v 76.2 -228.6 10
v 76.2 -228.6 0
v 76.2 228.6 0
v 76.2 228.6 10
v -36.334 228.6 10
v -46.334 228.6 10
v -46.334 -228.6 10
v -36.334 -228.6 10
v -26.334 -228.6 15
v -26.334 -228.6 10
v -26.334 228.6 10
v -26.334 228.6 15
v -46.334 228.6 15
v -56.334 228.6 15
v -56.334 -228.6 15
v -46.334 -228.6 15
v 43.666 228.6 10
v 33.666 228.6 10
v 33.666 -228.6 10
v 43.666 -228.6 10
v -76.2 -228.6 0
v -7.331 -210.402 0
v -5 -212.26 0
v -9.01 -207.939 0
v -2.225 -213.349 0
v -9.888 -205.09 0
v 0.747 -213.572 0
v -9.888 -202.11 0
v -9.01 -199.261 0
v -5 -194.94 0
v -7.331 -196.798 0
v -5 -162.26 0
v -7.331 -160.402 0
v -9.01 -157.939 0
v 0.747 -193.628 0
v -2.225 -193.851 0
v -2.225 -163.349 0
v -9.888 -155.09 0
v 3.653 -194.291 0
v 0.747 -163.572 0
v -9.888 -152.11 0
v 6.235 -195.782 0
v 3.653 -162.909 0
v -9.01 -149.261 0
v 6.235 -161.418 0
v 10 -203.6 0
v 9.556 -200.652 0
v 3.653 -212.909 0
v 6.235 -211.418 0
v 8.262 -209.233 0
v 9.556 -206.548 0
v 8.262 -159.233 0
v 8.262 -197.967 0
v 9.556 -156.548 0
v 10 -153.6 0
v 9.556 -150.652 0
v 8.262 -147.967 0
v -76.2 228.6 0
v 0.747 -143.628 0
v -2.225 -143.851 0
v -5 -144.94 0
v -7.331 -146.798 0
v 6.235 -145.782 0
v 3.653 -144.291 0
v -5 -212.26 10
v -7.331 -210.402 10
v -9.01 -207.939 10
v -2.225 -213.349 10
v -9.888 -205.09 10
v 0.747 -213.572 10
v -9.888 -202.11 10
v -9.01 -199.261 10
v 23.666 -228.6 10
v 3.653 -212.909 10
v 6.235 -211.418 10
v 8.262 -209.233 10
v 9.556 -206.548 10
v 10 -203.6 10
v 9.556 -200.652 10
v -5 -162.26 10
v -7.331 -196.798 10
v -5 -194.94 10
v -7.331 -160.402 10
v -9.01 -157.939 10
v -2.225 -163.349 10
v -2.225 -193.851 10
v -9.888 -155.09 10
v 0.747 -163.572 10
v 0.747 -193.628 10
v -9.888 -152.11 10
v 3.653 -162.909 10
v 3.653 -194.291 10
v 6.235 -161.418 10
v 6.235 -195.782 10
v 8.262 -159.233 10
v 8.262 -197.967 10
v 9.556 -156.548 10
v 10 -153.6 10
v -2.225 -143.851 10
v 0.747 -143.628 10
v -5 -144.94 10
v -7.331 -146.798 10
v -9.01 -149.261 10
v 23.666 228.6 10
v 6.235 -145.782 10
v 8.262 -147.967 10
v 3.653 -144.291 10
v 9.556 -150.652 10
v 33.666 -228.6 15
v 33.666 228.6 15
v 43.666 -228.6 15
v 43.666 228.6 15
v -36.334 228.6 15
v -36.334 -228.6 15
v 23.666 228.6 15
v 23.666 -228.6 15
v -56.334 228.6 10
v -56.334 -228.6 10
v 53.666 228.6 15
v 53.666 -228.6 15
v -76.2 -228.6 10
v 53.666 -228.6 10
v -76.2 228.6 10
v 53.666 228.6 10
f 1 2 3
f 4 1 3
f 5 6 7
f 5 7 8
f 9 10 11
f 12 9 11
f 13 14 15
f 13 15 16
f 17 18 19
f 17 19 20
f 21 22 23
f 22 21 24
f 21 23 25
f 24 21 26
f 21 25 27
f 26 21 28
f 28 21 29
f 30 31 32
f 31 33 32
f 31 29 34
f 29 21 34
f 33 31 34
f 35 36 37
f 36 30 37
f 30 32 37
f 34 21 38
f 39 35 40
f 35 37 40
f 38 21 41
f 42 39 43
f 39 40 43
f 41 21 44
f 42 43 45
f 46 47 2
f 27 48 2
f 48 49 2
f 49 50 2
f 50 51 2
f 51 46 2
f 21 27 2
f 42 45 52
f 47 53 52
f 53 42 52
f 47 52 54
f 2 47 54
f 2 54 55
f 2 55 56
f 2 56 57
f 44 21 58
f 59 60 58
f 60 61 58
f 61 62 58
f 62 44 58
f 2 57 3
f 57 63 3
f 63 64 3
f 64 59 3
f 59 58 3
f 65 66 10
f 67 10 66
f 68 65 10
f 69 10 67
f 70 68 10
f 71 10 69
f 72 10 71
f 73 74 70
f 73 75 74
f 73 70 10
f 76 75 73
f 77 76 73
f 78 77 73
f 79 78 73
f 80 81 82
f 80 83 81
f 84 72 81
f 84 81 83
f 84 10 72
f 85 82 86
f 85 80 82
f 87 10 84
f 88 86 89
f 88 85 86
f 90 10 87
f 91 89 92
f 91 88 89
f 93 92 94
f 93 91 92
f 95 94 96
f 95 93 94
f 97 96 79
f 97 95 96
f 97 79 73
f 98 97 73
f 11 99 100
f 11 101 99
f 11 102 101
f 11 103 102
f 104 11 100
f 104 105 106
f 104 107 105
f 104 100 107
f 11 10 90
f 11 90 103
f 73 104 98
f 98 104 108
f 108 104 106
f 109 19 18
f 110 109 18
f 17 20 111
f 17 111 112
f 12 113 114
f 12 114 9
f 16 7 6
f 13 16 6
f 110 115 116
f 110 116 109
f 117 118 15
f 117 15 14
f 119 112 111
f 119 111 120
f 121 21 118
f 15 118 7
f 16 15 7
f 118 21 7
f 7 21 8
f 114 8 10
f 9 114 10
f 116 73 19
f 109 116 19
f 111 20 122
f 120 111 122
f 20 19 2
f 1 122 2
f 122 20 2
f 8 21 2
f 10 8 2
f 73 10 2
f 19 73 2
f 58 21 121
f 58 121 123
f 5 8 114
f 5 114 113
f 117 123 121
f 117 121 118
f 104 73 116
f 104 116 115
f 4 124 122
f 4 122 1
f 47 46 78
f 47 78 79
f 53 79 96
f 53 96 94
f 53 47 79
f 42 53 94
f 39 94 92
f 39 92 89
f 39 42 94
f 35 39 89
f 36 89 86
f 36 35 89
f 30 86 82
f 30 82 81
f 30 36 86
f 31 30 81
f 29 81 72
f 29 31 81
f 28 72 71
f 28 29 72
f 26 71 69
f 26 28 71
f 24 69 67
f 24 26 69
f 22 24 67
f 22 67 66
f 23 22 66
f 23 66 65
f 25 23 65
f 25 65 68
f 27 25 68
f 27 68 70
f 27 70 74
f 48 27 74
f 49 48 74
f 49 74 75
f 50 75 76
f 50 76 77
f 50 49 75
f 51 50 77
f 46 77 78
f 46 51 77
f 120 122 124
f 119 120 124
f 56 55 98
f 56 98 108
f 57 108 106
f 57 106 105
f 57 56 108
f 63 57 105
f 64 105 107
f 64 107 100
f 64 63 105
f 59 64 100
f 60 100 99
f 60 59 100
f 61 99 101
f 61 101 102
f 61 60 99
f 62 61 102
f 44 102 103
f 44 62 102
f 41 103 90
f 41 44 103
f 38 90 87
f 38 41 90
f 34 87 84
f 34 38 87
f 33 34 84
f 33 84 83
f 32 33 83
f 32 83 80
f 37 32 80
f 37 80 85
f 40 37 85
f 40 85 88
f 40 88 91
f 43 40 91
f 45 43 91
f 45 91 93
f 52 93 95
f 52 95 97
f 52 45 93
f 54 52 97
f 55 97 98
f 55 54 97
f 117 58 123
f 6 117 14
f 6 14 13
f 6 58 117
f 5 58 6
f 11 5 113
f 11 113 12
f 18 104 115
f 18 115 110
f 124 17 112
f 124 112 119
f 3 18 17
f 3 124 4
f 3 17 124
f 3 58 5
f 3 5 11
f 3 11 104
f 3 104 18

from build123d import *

# Parameters (mm, degrees)
SKETCH1_W           = 152.4
SKETCH1_H           = 457.2
SKETCH1_R           = 10
BOSS_EXTRUDE1_DEPTH = 10
SKETCH2_W           = 10
SKETCH2_H           = 457.2
EXTRUDE_THIN1_DEPTH = 5


with BuildPart() as part:
    # Sketch1 → Boss-Extrude1 (new body)
    with BuildSketch(Plane.XY):
        Rectangle(SKETCH1_W, SKETCH1_H)
        with Locations((0, -203.6)):
            Circle(SKETCH1_R, mode=Mode.SUBTRACT)
        with Locations((0, -153.6)):
            Circle(SKETCH1_R, mode=Mode.SUBTRACT)
    extrude(amount=BOSS_EXTRUDE1_DEPTH)

    # Sketch2 → Extrude-Thin1 (add)
    with BuildSketch(Plane.XY.offset(10)):
        with Locations((28.665766577, 0)):
            Rectangle(SKETCH2_W, SKETCH2_H)
        with Locations((48.665766577, 0)):
            Rectangle(SKETCH2_W, SKETCH2_H)
        with Locations((-31.334233423, 0)):
            Rectangle(SKETCH2_W, SKETCH2_H)
        with Locations((-51.334233423, 0)):
            Rectangle(SKETCH2_W, SKETCH2_H)
    extrude(amount=EXTRUDE_THIN1_DEPTH)


solid = part.part
